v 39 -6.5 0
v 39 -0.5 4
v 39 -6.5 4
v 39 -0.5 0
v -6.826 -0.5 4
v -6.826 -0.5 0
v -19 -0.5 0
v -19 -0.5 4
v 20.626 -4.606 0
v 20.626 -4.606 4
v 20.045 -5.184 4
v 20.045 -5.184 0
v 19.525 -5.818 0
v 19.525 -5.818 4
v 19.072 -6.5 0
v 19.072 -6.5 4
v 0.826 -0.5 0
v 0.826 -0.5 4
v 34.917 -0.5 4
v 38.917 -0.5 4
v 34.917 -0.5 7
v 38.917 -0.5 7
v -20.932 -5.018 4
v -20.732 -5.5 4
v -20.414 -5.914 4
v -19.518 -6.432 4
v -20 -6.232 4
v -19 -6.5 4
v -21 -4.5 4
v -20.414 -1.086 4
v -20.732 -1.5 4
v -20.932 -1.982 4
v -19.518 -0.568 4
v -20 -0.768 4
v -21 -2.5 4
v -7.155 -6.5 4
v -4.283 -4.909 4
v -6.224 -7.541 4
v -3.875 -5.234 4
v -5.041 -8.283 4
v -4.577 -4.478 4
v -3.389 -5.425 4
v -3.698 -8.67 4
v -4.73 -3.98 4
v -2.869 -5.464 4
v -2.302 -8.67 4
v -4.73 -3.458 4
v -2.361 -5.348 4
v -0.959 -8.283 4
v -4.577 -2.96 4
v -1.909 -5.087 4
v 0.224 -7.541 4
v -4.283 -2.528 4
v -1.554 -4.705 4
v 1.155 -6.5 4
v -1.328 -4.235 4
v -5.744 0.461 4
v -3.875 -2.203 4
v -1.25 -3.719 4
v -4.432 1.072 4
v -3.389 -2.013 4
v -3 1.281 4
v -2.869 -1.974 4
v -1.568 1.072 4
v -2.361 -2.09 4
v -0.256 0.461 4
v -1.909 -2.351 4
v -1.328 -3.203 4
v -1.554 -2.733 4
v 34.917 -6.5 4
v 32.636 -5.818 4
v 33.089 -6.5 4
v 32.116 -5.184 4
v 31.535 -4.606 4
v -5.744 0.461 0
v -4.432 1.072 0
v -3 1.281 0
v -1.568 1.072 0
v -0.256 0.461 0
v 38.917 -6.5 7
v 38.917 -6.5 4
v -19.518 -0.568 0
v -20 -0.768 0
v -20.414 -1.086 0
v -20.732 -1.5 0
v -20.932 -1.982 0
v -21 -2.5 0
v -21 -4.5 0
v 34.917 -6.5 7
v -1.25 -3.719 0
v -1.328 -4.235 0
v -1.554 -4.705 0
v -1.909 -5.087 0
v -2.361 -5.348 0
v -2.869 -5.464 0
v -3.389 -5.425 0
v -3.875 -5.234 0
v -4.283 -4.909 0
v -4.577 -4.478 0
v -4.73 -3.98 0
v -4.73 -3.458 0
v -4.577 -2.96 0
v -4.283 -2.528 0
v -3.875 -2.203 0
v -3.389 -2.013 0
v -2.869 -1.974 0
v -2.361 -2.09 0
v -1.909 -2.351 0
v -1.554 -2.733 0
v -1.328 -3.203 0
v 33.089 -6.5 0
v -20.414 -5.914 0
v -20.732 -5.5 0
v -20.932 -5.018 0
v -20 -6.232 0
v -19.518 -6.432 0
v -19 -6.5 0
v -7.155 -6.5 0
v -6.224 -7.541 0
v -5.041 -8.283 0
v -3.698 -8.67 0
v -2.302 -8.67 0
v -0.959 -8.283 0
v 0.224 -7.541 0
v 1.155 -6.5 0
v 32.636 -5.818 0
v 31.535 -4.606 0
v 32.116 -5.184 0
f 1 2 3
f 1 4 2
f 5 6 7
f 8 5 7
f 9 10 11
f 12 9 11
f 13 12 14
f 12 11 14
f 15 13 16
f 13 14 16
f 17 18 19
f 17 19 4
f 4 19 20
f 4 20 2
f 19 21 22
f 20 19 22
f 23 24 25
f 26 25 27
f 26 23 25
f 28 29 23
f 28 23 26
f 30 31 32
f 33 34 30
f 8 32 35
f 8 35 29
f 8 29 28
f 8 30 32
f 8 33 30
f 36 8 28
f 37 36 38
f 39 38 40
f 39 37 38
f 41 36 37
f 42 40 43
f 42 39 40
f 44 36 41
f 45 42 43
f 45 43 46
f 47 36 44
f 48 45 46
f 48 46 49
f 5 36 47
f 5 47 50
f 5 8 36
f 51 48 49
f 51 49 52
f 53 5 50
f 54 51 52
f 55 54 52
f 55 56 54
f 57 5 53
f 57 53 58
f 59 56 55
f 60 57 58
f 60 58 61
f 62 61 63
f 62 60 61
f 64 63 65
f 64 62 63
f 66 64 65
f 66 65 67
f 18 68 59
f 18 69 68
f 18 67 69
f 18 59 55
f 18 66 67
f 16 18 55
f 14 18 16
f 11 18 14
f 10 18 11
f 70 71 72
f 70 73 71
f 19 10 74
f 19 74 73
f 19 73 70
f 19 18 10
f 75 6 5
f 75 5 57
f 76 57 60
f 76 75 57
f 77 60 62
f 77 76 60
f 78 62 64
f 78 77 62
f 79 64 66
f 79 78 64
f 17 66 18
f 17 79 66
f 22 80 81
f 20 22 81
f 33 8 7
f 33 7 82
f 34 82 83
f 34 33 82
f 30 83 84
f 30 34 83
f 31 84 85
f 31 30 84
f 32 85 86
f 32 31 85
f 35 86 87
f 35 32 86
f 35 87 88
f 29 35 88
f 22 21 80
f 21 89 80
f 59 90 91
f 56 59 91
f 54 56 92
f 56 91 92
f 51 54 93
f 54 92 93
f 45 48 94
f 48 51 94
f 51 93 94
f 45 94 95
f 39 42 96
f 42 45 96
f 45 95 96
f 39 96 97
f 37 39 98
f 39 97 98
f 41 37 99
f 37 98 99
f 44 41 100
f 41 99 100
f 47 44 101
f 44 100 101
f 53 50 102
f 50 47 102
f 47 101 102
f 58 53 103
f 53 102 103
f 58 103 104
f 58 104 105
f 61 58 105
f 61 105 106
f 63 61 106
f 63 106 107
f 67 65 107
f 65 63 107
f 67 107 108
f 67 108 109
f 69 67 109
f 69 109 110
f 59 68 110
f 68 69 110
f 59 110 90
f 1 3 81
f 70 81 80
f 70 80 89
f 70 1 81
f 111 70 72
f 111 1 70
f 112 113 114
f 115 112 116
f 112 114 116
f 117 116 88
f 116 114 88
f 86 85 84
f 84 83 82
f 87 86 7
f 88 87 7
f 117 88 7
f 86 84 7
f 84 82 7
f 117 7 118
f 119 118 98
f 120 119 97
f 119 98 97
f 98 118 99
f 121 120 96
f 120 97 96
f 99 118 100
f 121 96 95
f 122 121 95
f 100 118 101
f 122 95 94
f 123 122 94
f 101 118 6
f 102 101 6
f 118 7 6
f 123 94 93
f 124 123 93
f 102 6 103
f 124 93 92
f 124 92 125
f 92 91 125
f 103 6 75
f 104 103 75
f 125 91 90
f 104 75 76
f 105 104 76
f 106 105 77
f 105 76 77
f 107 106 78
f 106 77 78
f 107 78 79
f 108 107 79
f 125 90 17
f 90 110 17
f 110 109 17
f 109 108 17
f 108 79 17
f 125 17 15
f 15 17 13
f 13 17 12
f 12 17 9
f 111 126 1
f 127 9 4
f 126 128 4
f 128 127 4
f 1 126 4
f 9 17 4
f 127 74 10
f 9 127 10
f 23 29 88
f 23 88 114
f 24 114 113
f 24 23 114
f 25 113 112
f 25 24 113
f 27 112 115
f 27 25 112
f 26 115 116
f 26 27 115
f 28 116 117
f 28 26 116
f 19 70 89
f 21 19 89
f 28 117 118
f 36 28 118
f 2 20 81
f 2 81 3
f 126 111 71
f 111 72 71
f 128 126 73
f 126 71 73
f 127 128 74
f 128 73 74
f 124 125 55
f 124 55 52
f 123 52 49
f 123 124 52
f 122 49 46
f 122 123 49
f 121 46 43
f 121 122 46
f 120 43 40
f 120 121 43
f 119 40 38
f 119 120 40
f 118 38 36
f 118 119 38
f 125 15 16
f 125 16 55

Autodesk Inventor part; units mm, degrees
ref_plane "YZ Plane" through (0, 0, 0) normal (1, 0, 0) x (0, 1, 0)
ref_plane "XZ Plane" through (0, 0, 0) normal (0, 1, 0) x (-1, 0, 0)
ref_plane "XY Plane" through (0, 0, 0) normal (0, 0, 1) x (1, 0, 0)
sketch "Skizze1" plane through (0, 0, 0) normal (0, 0, 1) x (1, 0, 0)
  line L0 (2, -8) -> (-6, -8) construction
  line L1 (2, 0) -> (2, -8) construction
  line L2 (0, 0) -> (2, 0) construction
  line L3 (0, 1.7577) -> (0, 0) construction
  line L4 (2, 1.7577) -> (0, 1.7577) construction
  line L5 (2, 1.7577) -> (2, 8.4467) construction
  line L6 (0, 8.4467) -> (2, 8.4467) construction
  line L7 (0, 11) -> (0, 8.4467) construction
  line L8 (-6, 11) -> (0, 11) construction
  line L9 (-6, -8) -> (-6, 11) construction
  circle A0 centre (-3, -3.7188) radius 1.75 construction
  circle A1 centre (-3, -3.7188) radius 1.75
  line L10 (5.65, 17) -> (8.35, 17) construction
  line L11 (11, -0.5) -> (11, 14.5) construction
  line L12 (3, -0.5) -> (11, -0.5) construction
  line L13 (3, -0.5) -> (3, 14.5) construction
  line L14 (7, 17) -> (39, 17) construction
  line L15 (0.8261, -0.5) -> (39, -0.5)
  line L16 (39, -0.5) -> (39, -6.5)
  line L17 (39, -6.5) -> (1.1551, -6.5)
  line L18 (-6.8261, -0.5) -> (-21, -0.5)
  line L19 (-21, -0.5) -> (-21, -6.5)
  line L20 (-21, -6.5) -> (-7.1551, -6.5)
  line L21 (-6, -6.5) -> (-6, -0.5) construction
  arc A2 (0.8261, -0.5) -> (-6.8261, -0.5) centre (-3, -3.7188) ccw
  arc A3 (-7.1551, -6.5) -> (1.1551, -6.5) centre (-3, -3.7188) ccw
  dimension "d0" = 32
  dimension "d1" = 6
  dimension "d2" = 15
extrude "Extrusion1" add sketch "Skizze1" along normal blind 4
sketch "Skizze2" plane through (1.1551, -6.5, 0) normal (0, -1, 0) x (1, 0, 0)
  line L0 (37.7621, 0) -> (33.7621, 0)
  line L1 (33.7621, 0) -> (33.7621, 7)
  line L2 (33.7621, 7) -> (37.7621, 7)
  line L3 (37.7621, 7) -> (37.7621, 0)
  point P0 (-1.1551, 0)
  dimension "d5" = 4
  dimension "d6" = 7
extrude "Extrusion3" add sketch "Skizze2" against normal blind 6
sketch "Skizze3" plane through (0, 0, 4) normal (0, 0, 1) x (1, 0, 0)
  circle A0 centre (-3, -3.7188) radius 1.75 construction
  line L0 (34.9172, -6.5) -> (34.9172, -0.5) construction
  line L1 (34.9172, -0.5) -> (0.8261, -0.5) construction
  arc A1 (0.8261, -0.5) -> (-6.8261, -0.5) centre (-3, -3.7188) ccw construction
  line L2 (-6.8261, -0.5) -> (-21, -0.5) construction
  line L3 (-21, -0.5) -> (-21, -6.5) construction
  line L4 (-21, -6.5) -> (-7.1551, -6.5) construction
  arc A2 (-7.1551, -6.5) -> (1.1551, -6.5) centre (-3, -3.7188) ccw construction
  line L5 (1.1551, -6.5) -> (34.9172, -6.5) construction
  line L6 (34.9172, -4.4009) -> (29.9172, -4.4009) construction
  arc A3 (33.0892, -6.5) -> (19.0718, -6.5) centre (26.0805, -10.6676) ccw
  line L7 (19.0718, -6.5) -> (33.0892, -6.5)
  line L8 (1.1551, -6.5) -> (34.9172, -6.5) construction
  point P0 (0, 0)
  dimension "d11" = 5
extrude "Extrusion4" cut sketch "Skizze3" against normal blind 6
sketch "Skizze4" plane through (0, 0, 4) normal (0, 0, 1) x (1, 0, 0)
  arc A0 (33.0892, -6.5) -> (19.0718, -6.5) centre (26.0805, -10.6676) ccw construction
  line L0 (33.0892, -6.5) -> (34.9172, -6.5) construction
  line L1 (34.9172, -6.5) -> (34.9172, -0.5) construction
  line L2 (34.9172, -0.5) -> (0.8261, -0.5) construction
  arc A1 (0.8261, -0.5) -> (-6.8261, -0.5) centre (-3, -3.7188) ccw construction
  line L3 (-6.8261, -0.5) -> (-21, -0.5) construction
  line L4 (-21, -0.5) -> (-21, -6.5) construction
  line L5 (-21, -6.5) -> (-7.1551, -6.5) construction
  arc A2 (-7.1551, -6.5) -> (1.1551, -6.5) centre (-3, -3.7188) ccw construction
  line L6 (1.1551, -6.5) -> (19.0718, -6.5) construction
  circle A3 centre (-3, -3.7188) radius 1.75 construction
  line L7 (17.8717, -0.5) -> (33.0892, -0.5)
  line L8 (33.0892, -0.5) -> (33.0892, -4.6064)
  line L9 (33.0892, -4.6064) -> (17.8717, -4.6064)
  line L10 (17.8717, -4.6064) -> (17.8717, -0.5)
  point P0 (0, 0)
extrude "Extrusion5" add sketch "Skizze4" against normal blind 4
fillet "Rundung1" radius 2 2 edges at (-21, -0.5, 2) (-21, -6.5, 2)
properties part number "Reset_beam"
